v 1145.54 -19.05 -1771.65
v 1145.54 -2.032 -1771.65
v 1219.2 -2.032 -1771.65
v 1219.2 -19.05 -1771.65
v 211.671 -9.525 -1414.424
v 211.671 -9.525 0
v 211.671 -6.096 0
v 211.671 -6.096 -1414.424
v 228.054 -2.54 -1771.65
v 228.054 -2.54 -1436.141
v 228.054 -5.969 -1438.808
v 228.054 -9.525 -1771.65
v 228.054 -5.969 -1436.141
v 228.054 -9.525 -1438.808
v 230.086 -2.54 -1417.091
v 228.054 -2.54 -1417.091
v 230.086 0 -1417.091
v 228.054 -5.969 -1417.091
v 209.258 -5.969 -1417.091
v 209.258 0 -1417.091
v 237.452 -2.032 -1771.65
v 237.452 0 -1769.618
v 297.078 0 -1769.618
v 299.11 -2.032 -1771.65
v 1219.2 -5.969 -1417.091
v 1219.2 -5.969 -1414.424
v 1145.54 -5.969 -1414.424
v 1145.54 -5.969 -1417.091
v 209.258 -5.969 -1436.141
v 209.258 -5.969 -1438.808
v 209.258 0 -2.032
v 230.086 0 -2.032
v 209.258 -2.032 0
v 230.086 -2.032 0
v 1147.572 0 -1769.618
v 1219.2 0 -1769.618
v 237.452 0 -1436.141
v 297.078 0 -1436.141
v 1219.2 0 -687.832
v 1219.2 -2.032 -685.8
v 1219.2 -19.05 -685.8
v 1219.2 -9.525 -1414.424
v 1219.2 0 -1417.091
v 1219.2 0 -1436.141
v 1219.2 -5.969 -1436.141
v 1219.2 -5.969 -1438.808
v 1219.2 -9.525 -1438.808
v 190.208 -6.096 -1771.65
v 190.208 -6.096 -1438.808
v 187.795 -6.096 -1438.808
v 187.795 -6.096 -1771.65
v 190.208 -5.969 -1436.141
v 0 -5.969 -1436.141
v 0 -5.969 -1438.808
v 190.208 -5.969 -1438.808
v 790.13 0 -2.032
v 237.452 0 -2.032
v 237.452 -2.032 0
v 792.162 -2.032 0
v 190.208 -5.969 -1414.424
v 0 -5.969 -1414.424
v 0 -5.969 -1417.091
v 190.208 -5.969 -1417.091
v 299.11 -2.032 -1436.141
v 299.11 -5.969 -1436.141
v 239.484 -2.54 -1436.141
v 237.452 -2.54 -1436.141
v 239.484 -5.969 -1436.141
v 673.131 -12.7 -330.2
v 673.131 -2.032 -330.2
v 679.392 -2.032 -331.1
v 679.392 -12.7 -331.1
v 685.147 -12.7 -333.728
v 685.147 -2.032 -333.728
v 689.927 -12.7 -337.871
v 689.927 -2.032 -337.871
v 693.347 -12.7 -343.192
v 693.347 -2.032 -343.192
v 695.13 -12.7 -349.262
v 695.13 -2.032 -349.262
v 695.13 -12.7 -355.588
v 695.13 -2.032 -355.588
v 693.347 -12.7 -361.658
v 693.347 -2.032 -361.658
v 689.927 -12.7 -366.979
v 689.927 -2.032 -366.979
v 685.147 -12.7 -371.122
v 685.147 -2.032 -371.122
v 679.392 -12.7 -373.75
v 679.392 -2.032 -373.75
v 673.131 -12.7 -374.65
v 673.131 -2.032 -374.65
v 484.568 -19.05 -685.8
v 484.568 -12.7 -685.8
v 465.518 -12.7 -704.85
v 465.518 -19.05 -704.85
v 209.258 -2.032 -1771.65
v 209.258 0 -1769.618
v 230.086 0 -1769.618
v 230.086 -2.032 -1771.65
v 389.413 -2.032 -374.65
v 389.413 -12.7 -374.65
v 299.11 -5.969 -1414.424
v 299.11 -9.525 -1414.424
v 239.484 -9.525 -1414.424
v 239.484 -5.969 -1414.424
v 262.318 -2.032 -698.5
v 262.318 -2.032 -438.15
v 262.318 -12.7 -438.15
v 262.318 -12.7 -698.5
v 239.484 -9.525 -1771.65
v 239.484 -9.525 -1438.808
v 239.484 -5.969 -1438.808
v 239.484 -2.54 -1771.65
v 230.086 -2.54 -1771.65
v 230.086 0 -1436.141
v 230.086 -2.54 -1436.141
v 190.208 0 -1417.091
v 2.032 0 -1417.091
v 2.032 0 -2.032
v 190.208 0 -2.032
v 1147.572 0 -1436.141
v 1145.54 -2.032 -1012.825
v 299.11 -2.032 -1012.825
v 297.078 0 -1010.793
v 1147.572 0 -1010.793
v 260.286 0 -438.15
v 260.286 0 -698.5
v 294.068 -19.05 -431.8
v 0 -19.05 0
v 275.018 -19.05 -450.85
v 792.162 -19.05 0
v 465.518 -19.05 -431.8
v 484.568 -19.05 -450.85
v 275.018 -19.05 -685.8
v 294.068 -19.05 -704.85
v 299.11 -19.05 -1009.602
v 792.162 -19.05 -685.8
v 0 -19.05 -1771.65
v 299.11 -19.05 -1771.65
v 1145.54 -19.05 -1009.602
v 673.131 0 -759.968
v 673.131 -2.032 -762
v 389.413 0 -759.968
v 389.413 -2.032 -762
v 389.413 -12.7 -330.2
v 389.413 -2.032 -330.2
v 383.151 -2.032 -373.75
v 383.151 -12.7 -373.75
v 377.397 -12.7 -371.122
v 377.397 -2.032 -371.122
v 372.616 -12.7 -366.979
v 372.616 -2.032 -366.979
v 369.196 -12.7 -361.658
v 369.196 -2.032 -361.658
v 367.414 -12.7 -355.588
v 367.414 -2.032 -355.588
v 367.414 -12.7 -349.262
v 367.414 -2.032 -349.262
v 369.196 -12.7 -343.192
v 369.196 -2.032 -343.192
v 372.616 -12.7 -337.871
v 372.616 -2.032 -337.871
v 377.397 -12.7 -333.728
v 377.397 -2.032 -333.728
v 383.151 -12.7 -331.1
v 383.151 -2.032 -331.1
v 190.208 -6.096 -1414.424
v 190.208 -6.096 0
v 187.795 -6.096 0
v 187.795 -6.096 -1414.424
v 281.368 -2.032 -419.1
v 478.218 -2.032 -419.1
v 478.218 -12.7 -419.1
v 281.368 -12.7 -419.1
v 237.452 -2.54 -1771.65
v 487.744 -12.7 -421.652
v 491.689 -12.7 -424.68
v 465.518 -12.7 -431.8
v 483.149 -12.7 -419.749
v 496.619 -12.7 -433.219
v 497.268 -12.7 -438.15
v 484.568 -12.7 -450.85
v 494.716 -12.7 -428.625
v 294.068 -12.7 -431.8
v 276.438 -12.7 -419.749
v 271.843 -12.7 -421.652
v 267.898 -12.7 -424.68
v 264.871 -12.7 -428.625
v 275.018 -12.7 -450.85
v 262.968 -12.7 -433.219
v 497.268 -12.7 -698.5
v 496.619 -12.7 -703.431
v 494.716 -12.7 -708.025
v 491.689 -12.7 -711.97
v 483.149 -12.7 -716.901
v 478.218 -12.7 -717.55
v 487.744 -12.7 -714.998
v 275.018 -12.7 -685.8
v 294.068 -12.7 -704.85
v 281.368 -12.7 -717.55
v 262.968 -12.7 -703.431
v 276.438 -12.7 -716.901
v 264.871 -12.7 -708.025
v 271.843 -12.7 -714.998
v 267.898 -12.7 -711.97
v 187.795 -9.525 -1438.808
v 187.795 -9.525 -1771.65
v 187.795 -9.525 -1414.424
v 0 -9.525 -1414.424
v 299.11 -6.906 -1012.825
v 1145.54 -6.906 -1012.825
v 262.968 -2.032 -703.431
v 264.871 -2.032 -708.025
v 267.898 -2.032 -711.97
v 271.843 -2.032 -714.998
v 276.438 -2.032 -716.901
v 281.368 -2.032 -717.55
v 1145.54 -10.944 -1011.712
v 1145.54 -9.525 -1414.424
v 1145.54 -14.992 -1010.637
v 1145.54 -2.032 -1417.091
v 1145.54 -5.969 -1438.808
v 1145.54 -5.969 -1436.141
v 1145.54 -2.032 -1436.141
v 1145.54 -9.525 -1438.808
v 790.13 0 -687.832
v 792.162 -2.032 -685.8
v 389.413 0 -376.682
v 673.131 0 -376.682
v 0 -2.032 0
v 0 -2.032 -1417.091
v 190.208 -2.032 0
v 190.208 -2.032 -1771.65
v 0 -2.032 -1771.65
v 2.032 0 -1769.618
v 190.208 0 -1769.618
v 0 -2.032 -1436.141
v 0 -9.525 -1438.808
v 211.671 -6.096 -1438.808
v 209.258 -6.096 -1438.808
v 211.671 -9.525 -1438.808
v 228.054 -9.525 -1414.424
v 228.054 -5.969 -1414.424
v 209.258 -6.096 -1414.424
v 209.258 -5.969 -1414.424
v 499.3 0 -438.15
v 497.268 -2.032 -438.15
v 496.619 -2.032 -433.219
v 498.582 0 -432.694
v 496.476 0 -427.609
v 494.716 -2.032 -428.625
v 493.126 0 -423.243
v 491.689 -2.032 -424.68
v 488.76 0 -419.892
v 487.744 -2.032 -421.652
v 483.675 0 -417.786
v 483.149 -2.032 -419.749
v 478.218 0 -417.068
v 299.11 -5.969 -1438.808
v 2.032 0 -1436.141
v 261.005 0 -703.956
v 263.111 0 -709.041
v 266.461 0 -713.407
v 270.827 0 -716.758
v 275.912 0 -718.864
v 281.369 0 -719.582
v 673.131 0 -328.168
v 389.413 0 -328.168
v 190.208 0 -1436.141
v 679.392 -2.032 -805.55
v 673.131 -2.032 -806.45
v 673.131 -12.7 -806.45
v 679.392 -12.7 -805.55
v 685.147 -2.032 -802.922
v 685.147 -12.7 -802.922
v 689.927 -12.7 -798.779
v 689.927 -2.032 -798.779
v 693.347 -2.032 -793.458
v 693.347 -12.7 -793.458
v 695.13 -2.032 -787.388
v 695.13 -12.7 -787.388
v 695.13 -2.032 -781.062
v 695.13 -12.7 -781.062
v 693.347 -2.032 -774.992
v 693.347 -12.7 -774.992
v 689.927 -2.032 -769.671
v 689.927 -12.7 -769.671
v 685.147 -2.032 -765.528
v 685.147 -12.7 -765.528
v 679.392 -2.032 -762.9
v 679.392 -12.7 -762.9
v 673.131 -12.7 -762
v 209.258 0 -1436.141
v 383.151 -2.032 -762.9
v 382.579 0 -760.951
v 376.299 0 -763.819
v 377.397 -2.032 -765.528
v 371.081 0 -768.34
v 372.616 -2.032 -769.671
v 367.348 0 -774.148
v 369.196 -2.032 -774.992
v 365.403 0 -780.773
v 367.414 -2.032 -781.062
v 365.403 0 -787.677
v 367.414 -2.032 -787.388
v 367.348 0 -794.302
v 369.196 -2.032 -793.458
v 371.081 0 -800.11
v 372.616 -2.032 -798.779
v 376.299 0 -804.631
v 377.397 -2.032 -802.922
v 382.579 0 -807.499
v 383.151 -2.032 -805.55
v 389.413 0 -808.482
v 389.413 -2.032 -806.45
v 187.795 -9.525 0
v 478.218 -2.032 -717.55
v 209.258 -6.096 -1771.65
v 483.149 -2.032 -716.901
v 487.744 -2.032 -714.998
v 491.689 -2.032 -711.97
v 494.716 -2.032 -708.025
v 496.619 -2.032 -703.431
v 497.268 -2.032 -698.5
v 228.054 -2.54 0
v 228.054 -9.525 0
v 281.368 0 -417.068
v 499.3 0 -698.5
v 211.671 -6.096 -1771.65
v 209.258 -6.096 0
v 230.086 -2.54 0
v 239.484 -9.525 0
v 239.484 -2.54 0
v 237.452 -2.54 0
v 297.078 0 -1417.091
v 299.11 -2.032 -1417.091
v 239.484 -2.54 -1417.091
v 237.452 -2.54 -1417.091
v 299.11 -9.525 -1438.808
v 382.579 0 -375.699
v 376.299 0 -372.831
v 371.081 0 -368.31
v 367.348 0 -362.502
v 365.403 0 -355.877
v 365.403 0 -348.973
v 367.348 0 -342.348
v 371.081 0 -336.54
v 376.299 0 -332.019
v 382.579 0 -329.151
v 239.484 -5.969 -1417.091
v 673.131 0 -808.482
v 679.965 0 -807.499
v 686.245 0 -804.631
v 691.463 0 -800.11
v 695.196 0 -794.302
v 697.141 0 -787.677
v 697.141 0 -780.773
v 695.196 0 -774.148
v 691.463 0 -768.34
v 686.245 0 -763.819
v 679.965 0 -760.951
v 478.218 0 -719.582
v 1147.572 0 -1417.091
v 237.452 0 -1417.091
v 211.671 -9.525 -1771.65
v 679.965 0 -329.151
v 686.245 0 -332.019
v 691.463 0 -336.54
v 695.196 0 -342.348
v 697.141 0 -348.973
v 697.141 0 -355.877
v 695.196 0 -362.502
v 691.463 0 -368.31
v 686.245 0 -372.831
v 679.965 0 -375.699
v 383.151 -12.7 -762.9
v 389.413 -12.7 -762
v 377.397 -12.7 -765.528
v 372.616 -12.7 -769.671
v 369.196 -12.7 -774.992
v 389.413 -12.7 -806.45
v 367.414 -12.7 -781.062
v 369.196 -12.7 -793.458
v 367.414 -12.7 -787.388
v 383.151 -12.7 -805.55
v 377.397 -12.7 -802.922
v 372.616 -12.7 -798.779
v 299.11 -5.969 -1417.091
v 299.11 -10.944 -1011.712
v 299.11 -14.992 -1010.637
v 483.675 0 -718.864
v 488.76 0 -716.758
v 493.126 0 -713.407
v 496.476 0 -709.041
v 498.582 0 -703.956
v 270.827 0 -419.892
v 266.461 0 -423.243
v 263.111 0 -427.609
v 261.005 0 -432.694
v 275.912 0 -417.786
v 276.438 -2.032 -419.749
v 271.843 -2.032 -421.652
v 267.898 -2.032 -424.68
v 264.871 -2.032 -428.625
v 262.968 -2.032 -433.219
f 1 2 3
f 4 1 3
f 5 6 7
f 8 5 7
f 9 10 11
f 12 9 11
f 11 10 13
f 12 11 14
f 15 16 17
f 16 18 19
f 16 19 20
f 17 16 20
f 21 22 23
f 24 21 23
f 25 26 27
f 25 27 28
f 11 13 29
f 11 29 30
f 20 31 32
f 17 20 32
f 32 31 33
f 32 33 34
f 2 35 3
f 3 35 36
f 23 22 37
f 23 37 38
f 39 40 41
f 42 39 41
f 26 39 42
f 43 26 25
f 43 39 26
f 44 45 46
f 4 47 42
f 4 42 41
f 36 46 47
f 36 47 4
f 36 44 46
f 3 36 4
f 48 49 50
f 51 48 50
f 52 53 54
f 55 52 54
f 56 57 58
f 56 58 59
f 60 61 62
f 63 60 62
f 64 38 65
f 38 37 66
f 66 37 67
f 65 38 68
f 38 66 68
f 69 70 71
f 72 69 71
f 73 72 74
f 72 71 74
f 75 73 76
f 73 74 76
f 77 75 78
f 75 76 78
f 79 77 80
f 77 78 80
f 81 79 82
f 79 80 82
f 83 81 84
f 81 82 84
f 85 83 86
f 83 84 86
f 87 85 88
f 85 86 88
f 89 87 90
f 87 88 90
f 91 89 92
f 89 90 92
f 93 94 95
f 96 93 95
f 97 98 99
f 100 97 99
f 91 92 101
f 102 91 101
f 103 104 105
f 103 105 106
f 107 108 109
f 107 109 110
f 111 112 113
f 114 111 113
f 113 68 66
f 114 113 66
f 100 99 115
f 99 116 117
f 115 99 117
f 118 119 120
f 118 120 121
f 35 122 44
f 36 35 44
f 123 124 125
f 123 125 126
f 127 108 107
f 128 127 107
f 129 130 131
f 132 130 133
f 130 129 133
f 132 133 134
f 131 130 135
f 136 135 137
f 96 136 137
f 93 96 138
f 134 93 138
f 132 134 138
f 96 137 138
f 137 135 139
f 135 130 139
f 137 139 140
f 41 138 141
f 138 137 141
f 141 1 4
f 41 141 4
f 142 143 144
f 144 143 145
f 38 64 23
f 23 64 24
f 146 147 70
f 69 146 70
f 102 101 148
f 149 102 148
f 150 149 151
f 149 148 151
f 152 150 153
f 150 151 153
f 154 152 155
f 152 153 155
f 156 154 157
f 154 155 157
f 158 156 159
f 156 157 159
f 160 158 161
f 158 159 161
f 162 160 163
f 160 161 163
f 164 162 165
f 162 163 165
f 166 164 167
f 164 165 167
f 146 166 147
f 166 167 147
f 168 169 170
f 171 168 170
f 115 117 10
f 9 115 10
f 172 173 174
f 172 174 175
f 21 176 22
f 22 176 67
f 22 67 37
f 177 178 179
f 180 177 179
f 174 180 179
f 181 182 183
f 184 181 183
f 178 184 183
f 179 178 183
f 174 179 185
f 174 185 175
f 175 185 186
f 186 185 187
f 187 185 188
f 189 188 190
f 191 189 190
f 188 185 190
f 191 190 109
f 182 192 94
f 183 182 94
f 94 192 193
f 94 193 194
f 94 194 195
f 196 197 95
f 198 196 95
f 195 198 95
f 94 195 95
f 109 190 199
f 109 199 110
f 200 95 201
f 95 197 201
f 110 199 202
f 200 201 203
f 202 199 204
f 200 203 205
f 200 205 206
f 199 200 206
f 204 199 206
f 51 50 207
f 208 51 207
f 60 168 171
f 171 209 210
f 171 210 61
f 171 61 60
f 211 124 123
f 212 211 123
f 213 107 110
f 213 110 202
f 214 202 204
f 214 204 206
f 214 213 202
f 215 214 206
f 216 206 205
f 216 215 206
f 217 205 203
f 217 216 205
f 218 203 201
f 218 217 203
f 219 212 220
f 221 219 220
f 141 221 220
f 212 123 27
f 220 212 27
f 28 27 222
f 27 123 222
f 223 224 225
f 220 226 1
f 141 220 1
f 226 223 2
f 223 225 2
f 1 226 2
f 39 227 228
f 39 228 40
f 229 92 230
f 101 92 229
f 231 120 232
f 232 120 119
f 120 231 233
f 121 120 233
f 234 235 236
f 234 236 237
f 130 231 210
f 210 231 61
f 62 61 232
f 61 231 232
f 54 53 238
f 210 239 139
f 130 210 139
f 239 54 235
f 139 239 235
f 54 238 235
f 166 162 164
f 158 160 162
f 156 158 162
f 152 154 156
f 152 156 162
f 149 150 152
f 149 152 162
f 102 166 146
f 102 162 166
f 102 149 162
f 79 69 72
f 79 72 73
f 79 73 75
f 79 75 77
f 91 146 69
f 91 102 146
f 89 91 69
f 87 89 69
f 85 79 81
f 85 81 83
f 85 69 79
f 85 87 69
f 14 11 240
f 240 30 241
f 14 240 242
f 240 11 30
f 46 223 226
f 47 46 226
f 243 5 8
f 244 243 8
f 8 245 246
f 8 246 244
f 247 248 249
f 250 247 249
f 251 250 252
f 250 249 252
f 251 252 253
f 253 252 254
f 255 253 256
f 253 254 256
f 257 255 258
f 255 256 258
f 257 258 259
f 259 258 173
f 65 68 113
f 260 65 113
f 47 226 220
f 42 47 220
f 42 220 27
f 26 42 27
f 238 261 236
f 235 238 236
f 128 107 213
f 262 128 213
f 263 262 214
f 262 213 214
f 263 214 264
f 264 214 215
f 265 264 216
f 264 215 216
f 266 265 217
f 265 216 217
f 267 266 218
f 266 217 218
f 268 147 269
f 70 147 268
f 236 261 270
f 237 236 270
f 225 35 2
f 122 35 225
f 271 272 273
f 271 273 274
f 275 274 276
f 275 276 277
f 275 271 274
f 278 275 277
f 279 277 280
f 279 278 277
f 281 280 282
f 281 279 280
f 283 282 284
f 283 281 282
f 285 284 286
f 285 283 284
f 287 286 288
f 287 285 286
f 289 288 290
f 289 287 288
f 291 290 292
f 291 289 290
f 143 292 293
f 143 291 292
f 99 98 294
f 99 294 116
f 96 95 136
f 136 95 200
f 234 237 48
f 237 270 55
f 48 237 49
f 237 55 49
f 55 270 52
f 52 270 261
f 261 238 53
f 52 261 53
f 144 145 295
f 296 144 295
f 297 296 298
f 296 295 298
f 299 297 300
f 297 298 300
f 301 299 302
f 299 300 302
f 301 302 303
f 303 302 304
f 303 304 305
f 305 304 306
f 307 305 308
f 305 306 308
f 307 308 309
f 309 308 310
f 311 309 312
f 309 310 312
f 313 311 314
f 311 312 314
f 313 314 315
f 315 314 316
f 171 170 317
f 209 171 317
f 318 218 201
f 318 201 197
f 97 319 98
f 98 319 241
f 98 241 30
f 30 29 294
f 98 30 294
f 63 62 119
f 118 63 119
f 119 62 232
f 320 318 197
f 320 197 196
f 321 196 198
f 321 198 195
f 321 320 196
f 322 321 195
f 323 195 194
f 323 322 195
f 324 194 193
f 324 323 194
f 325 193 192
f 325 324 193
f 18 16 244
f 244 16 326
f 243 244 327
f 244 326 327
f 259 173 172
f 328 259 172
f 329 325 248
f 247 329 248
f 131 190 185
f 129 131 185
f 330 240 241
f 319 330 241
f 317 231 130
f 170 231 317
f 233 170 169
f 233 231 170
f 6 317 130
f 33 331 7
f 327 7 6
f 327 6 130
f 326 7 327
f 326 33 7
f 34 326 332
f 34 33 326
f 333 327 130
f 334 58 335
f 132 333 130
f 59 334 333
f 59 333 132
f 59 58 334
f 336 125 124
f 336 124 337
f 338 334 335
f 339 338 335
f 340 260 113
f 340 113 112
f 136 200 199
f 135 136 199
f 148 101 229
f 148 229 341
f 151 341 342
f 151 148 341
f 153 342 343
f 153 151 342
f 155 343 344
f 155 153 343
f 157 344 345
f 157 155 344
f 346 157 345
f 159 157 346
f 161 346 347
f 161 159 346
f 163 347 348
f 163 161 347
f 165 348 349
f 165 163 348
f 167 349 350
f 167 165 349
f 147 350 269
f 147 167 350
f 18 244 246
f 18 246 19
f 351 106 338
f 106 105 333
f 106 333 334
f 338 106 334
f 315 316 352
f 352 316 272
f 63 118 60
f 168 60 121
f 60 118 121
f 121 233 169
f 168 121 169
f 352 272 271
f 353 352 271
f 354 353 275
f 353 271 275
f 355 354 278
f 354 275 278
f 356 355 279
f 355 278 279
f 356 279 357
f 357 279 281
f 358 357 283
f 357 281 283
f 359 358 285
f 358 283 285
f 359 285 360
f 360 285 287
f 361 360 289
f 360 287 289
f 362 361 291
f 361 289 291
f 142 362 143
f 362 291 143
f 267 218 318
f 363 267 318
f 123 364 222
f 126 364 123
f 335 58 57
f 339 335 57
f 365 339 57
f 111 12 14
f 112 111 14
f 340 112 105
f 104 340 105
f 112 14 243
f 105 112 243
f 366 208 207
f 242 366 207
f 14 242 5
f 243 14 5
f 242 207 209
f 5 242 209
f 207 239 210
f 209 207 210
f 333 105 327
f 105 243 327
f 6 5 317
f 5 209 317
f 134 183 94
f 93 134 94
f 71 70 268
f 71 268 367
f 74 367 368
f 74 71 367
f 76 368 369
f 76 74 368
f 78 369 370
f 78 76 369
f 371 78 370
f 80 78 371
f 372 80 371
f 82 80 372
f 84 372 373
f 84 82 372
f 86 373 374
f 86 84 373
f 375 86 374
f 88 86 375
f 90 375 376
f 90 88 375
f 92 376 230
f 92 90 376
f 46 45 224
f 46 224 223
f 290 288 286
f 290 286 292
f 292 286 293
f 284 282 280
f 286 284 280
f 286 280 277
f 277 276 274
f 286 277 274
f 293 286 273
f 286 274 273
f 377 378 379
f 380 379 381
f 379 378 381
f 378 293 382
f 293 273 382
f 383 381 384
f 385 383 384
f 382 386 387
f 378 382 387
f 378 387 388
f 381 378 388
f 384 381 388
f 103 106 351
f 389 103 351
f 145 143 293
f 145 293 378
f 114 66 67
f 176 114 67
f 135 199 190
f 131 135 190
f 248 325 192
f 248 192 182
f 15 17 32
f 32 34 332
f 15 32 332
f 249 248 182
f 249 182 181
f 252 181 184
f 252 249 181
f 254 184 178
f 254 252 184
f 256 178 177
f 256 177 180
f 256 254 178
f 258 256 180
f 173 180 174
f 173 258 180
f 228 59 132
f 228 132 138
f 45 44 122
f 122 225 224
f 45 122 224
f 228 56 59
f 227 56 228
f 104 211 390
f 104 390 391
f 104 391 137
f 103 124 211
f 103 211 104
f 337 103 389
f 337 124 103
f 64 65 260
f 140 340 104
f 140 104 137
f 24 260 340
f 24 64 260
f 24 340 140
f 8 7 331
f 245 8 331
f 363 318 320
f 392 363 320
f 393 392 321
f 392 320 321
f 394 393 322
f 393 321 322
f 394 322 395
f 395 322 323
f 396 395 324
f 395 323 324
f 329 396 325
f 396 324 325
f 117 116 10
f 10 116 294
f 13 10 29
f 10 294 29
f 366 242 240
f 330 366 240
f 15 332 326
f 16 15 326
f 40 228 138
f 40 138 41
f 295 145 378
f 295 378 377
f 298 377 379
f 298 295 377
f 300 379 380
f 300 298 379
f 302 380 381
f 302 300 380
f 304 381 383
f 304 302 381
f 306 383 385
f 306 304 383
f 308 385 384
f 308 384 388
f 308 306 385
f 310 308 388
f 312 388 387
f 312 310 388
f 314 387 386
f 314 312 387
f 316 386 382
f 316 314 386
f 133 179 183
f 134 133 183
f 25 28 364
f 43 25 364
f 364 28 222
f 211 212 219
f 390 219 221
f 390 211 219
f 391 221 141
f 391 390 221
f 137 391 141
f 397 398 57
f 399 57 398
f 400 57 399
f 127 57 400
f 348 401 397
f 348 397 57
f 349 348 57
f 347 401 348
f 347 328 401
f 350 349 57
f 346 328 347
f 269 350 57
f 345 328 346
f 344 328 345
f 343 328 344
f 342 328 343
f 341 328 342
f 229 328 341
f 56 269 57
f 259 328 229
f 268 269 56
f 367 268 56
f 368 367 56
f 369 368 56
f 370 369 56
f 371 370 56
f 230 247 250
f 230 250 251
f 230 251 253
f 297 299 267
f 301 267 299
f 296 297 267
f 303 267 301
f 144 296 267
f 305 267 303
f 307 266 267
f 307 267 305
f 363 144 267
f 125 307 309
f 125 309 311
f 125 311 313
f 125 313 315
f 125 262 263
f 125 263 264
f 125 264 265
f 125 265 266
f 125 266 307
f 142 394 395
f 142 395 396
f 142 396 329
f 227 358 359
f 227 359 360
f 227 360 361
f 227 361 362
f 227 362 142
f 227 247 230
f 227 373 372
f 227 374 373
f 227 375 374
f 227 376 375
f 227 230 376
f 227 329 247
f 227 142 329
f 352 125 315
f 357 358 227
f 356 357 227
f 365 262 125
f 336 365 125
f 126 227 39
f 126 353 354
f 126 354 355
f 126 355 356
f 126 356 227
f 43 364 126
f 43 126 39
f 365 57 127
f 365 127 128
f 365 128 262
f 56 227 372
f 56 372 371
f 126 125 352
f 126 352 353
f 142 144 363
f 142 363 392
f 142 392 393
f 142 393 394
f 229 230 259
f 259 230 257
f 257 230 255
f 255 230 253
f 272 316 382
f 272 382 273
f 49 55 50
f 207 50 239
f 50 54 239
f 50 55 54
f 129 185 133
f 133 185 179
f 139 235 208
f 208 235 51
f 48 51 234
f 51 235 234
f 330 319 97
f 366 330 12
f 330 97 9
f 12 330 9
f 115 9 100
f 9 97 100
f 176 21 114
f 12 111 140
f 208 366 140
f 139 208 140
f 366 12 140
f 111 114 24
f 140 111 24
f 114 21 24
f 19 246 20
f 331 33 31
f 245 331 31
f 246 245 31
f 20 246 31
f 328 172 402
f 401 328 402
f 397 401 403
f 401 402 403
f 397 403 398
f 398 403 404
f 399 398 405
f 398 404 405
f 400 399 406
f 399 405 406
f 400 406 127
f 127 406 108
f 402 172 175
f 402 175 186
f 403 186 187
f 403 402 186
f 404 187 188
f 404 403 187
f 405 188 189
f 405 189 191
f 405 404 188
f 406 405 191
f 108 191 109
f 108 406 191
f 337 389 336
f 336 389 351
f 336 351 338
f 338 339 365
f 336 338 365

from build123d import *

# Parameters (mm, degrees)
SKETCH1_W           = 1219.2
SKETCH1_H           = 1771.65
BOSS_EXTRUDE1_DEPTH = 19.05
SKETCH3_W           = 508
SKETCH3_H           = 685.8
CUT_EXTRUDE2_DEPTH  = 20.05
SKETCH5_W           = 846.4296
SKETCH5_H           = 758.825
CUT_EXTRUDE4_DEPTH  = 20.05
CUT_EXTRUDE12_DEPTH = 846.4296
CUT_EXTRUDE5_DEPTH  = 12.7
CUT_EXTRUDE6_DEPTH  = 7.35
CUT_EXTRUDE11_DEPTH = 12.7
CUT_EXTRUDE8_DEPTH  = 1772.65
CUT_EXTRUDE10_DEPTH = 1220.2
CHAMFER2_SIZE       = 2.032


with BuildPart() as part:
    # Sketch1 → Boss-Extrude1 (new body)
    with BuildSketch(Plane(origin=(0, 0, 0), x_dir=(1, 0, 0), z_dir=(0, 1, 0))):
        with Locations((609.6, 885.825)):
            Rectangle(SKETCH1_W, SKETCH1_H)
    extrude(amount=-BOSS_EXTRUDE1_DEPTH)

    # Sketch3 → Cut-Extrude2 (cut, through all)
    with BuildSketch(Plane(origin=(0, 0, 0), x_dir=(1, 0, 0), z_dir=(0, 1, 0))):
        with Locations((1046.1625, 342.9)):
            Rectangle(SKETCH3_W, SKETCH3_H)
    extrude(amount=-CUT_EXTRUDE2_DEPTH, mode=Mode.SUBTRACT)

    # Sketch5 → Cut-Extrude4 (cut, through all)
    with BuildSketch(Plane(origin=(0, 0, 0), x_dir=(1, 0, 0), z_dir=(0, 1, 0))):
        with Locations((722.3252, 1392.2375)):
            Rectangle(SKETCH5_W, SKETCH5_H)
    extrude(amount=-CUT_EXTRUDE4_DEPTH, mode=Mode.SUBTRACT)

    # Sketch18 → Cut-Extrude12 (cut)
    with BuildSketch(Plane(origin=(299.1104, 0, 0), x_dir=(0, 0, -1), z_dir=(1, 0, 0))):
        with BuildLine():
            Line((1009.601754844, -19.05), (1771.65, -19.05))
            Line((1771.65, -19.05), (1771.65, 0))
            Line((1771.65, 0), (1014.82750315, 0))
            ThreePointArc((1014.82750315, 0), (1012.106135013, -9.495238202), (1009.601754844, -19.05))
        make_face()
    extrude(amount=CUT_EXTRUDE12_DEPTH, mode=Mode.SUBTRACT)

    # Sketch7 → Cut-Extrude5 (cut)
    with BuildSketch(Plane(origin=(0, 0, 0), x_dir=(1, 0, 0), z_dir=(0, 1, 0))):
        with BuildLine():
            Line((281.3685, 717.55), (478.2185, 717.55))
            ThreePointArc((478.2185, 717.55), (491.688884182, 711.970384182), (497.2685, 698.5))
            Line((497.2685, 698.5), (497.2685, 438.15))
            ThreePointArc((497.2685, 438.15), (491.688884182, 424.679615818), (478.2185, 419.1))
            Line((478.2185, 419.1), (281.3685, 419.1))
            ThreePointArc((281.3685, 419.1), (267.898115818, 424.679615818), (262.3185, 438.15))
            Line((262.3185, 438.15), (262.3185, 698.5))
            ThreePointArc((262.3185, 698.5), (267.898115818, 711.970384182), (281.3685, 717.55))
        make_face()
    extrude(amount=-CUT_EXTRUDE5_DEPTH, mode=Mode.SUBTRACT)

    # Sketch8 → Cut-Extrude6 (cut, through all)
    with BuildSketch(Plane(origin=(0, -12.7, 0), x_dir=(1, 0, 0), z_dir=(0, 1, 0))):
        Polygon((294.0685, 704.85), (275.0185, 685.8), (275.0185, 450.85), (294.0685, 431.8), (465.5185, 431.8), (484.5685, 450.85), (484.5685, 685.8), (465.5185, 704.85), align=None)
    extrude(amount=-CUT_EXTRUDE6_DEPTH, mode=Mode.SUBTRACT)

    # Sketch17 → Cut-Extrude11 (cut)
    with BuildSketch(Plane(origin=(0, 0, 0), x_dir=(1, 0, 0), z_dir=(0, 1, 0))):
        with BuildLine():
            Line((389.412860427, 806.45), (673.130860427, 806.45))
            ThreePointArc((673.130860427, 806.45), (695.355860427, 784.225), (673.130860427, 762))
            Line((673.130860427, 762), (389.412860427, 762))
            ThreePointArc((389.412860427, 762), (367.187860427, 784.225), (389.412860427, 806.45))
        make_face()
        with BuildLine():
            Line((389.412860427, 330.2), (673.130860427, 330.2))
            ThreePointArc((673.130860427, 330.2), (695.355860427, 352.425), (673.130860427, 374.65))
            Line((673.130860427, 374.65), (389.412860427, 374.65))
            ThreePointArc((389.412860427, 374.65), (367.187860427, 352.425), (389.412860427, 330.2))
        make_face()
    extrude(amount=-CUT_EXTRUDE11_DEPTH, mode=Mode.SUBTRACT)

    # Sketch12 → Cut-Extrude8 (cut, through all)
    with BuildSketch(Plane.XY):
        Polygon((209.2579, 0), (190.2079, 0), (190.2079, -6.096), (187.7949, -6.096), (187.7949, -9.525), (211.6709, -9.525), (211.6709, -6.096), (209.2579, -6.096), align=None)
        Polygon((237.4519, 0), (230.0859, 0), (230.0859, -2.54), (228.0539, -2.54), (228.0539, -9.525), (239.4839, -9.525), (239.4839, -2.54), (237.4519, -2.54), align=None)
    extrude(amount=-CUT_EXTRUDE8_DEPTH, mode=Mode.SUBTRACT)

    # Sketch16 → Cut-Extrude10 (cut, through all)
    with BuildSketch(Plane.ZY):
        Polygon((-1438.8084, -9.525), (-1414.4244, -9.525), (-1414.4244, -5.969), (-1417.0914, -5.969), (-1417.0914, 0), (-1436.1414, 0), (-1436.1414, -5.969), (-1438.8084, -5.969), align=None)
    extrude(amount=-CUT_EXTRUDE10_DEPTH, mode=Mode.SUBTRACT)

    # Chamfer2
    chamfer2_edges = [part.edges().sort_by_distance(p)[0] for p in [
        (367.187860427, 0, -784.225),
        (531.271860427, 0, -762),
        (695.355860427, 0, -784.225),
        (531.271860427, 0, -806.45),
        (367.187860427, 0, -352.425),
        (531.271860427, 0, -330.2),
        (695.355860427, 0, -352.425),
        (531.271860427, 0, -374.65),
        (1005.68125, 0, -685.8),
        (219.6719, 0, -1771.65),
        (95.10395, 0, -1771.65),
        (219.6719, 0, 0),
        (514.8072, 0, 0),
        (792.1625, 0, -342.9),
        (1145.54, 0, -1603.8957),
        (299.1104, 0, -1214.9582),
        (0, 0, -708.5457),
        (268.28115, 0, -1771.65),
        (299.1104, 0, -1603.8957),
        (722.3252, 0, -1012.825),
        (1145.54, 0, -1214.9582),
        (0, 0, -1603.8957),
        (1182.37, 0, -1771.65),
        (95.10395, 0, 0),
        (491.688884182, 0, -424.679615818),
        (497.2685, 0, -568.325),
        (491.688884182, 0, -711.970384182),
        (379.7935, 0, -717.55),
        (267.898115818, 0, -711.970384182),
        (262.3185, 0, -568.325),
        (267.898115818, 0, -424.679615818),
        (379.7935, 0, -419.1),
    ]]
    chamfer(chamfer2_edges, length=CHAMFER2_SIZE)


solid = part.part
